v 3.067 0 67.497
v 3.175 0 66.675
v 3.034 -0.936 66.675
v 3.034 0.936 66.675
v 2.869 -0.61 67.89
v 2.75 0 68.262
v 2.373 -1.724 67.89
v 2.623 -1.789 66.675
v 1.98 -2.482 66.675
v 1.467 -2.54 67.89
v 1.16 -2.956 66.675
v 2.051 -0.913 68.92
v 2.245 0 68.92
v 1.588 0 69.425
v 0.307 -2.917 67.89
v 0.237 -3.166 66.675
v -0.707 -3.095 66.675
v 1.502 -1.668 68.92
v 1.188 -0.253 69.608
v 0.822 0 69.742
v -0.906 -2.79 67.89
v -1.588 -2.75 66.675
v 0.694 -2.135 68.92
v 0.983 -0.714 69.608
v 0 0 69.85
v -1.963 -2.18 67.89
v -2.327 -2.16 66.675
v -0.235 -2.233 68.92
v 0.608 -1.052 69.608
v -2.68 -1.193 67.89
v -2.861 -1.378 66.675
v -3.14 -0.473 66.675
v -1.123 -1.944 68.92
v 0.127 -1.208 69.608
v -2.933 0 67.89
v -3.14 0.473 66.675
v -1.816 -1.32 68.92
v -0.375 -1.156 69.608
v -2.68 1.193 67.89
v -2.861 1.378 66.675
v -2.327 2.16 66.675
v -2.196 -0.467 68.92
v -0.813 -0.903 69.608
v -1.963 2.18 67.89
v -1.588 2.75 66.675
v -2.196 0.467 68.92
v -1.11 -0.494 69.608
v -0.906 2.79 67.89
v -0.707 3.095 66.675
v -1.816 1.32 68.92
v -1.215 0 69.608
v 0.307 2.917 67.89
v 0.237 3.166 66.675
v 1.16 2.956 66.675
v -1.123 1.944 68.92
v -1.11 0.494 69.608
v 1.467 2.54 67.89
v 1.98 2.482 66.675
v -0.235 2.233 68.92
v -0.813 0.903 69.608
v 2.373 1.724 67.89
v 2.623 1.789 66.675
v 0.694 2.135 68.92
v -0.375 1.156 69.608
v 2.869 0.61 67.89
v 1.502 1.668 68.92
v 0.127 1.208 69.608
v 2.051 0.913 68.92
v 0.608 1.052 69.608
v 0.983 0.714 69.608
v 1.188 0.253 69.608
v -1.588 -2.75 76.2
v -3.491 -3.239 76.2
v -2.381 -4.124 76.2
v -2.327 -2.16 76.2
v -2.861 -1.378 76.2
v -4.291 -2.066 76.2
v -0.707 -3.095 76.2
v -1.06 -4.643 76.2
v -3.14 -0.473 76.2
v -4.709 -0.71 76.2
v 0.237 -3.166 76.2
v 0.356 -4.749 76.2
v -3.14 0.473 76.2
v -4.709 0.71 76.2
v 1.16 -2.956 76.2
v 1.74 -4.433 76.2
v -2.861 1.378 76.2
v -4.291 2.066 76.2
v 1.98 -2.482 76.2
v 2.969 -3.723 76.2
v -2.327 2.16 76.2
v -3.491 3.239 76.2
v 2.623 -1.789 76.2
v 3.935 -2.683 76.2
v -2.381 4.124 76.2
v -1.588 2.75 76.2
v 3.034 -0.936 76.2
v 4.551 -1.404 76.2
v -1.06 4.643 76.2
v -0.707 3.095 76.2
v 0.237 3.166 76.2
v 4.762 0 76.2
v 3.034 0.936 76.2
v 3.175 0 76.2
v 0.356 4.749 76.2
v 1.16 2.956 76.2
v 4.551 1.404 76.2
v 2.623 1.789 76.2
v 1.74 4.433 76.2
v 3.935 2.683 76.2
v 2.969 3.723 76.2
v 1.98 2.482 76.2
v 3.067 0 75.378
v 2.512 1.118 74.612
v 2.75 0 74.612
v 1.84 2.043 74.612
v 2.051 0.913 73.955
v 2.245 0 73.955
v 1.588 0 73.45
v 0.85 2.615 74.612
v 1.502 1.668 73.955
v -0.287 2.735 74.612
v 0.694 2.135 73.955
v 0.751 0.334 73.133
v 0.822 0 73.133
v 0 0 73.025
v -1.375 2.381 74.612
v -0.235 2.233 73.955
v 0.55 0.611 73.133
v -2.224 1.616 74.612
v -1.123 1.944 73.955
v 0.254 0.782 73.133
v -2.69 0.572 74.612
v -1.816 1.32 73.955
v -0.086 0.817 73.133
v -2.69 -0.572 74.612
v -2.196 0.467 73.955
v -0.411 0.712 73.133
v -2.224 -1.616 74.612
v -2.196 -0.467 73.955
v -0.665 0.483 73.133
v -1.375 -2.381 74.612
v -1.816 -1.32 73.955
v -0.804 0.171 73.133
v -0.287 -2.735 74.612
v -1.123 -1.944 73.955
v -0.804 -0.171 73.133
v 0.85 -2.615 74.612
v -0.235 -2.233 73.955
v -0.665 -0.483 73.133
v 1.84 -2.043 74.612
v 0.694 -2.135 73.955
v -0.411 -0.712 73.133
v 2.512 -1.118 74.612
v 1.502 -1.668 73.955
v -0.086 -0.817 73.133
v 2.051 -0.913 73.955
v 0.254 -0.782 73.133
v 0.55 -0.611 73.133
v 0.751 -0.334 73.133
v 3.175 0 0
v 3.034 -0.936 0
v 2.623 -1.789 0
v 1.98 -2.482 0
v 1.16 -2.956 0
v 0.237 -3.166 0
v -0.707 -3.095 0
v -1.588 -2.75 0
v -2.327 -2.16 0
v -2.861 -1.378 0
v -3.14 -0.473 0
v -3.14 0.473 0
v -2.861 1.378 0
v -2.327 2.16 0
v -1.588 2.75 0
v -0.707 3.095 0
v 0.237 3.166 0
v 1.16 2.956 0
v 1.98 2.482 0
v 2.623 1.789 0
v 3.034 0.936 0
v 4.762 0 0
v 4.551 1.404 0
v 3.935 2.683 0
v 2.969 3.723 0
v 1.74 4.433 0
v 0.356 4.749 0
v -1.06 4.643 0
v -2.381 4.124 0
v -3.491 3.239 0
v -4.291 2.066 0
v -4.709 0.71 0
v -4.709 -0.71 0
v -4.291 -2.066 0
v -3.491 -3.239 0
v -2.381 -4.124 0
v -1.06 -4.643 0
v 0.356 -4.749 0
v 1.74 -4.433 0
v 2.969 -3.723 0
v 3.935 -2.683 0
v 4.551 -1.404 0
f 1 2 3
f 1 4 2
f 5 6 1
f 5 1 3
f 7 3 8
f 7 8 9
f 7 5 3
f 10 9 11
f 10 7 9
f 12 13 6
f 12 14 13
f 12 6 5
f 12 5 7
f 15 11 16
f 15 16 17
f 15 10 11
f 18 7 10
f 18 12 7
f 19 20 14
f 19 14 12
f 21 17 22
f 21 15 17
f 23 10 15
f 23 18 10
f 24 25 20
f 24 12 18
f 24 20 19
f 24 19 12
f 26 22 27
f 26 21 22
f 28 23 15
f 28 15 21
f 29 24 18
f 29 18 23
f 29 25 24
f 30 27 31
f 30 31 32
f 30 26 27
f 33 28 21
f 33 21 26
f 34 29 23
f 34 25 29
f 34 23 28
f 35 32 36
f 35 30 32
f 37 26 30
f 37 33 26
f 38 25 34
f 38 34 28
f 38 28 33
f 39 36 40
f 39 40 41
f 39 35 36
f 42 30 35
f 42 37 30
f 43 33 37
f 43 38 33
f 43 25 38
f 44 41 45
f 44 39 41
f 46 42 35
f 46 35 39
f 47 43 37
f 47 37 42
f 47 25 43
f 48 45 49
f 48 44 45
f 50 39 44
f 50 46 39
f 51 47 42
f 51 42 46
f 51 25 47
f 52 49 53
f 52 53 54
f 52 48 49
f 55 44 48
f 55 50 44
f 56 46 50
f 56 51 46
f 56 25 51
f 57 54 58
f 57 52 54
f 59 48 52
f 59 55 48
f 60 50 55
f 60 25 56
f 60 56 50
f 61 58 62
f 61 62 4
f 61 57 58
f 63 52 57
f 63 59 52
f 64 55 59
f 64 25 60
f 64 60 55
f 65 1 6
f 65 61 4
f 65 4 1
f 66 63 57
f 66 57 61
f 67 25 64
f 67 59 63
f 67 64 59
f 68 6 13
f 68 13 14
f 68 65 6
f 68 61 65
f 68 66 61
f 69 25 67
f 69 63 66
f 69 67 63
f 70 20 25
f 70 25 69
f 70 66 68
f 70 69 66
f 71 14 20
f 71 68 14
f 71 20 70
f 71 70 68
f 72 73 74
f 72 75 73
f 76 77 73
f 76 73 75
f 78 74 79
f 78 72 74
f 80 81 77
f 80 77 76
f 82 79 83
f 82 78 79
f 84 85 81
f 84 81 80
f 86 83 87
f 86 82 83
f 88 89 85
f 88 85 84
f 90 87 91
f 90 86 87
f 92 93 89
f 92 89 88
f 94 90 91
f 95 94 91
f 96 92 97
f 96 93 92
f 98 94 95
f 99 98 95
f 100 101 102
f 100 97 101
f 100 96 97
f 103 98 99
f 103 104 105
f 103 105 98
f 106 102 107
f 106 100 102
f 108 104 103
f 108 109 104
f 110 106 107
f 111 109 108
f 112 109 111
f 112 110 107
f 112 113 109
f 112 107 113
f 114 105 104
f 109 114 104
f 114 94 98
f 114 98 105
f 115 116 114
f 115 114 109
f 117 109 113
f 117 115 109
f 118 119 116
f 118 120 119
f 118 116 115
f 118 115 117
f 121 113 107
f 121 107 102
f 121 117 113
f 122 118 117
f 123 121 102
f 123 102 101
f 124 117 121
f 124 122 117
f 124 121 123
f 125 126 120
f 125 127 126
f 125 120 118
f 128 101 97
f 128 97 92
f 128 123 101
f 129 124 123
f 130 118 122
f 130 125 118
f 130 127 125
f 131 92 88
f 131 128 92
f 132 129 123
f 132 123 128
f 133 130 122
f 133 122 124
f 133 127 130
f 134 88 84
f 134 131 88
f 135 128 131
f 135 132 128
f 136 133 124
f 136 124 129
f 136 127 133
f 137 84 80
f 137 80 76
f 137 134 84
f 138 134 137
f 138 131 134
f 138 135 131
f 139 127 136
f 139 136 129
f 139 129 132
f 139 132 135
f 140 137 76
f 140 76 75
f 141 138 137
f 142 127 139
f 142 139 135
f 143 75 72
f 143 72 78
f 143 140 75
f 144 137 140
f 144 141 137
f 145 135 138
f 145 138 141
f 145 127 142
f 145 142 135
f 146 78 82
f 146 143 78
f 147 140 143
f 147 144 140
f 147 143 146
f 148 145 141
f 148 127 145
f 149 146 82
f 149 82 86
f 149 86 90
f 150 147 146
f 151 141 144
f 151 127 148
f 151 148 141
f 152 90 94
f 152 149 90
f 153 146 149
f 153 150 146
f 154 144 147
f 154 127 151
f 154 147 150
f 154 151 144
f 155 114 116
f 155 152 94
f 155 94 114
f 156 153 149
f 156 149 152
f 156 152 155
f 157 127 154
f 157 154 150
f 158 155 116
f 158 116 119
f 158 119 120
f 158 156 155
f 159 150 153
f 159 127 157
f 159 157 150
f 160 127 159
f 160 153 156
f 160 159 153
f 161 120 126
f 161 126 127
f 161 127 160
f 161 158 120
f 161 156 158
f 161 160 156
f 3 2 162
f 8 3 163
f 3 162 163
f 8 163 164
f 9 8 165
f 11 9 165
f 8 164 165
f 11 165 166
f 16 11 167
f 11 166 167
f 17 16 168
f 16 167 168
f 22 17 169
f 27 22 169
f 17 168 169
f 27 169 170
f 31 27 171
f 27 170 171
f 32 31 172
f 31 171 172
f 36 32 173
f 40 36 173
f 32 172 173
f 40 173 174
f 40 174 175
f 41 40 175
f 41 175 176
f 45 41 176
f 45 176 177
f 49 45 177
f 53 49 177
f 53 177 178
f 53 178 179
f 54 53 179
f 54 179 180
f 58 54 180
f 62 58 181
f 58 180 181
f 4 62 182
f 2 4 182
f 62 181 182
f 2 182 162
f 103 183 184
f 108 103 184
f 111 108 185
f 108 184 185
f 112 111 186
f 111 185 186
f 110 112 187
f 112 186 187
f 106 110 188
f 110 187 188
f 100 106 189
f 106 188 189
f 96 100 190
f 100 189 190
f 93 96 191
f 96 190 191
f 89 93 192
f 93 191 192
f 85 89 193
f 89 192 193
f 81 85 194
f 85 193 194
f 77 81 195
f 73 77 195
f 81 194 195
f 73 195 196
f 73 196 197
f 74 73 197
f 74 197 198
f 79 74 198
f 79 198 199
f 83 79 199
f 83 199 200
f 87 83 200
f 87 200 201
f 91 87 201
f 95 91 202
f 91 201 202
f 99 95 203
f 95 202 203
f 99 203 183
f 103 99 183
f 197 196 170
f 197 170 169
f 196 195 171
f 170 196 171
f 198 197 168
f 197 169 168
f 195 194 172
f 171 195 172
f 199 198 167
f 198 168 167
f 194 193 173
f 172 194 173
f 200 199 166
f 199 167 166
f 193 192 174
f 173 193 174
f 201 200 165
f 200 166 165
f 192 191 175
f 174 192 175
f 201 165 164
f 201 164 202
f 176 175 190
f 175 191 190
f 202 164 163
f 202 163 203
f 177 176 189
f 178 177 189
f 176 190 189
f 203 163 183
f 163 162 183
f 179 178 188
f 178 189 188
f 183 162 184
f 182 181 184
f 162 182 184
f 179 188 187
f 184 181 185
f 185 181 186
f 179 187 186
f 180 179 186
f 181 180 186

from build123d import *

# Parameters (mm, degrees)
F0_R     = 4.7625
F1_DEPTH = 76.2
F2_R     = 3.175
F3_DEPTH = 3.175
F4_R     = 3.17499
F5_R     = 3.175
F6_DEPTH = 69.85
F7_R     = 3.175


# Not quite as in the source:
# - a fillet or chamfer is up to 0.001 mm smaller than in the source, because OpenCascade refuses the exact size


with BuildPart() as f1:
    # F0 (on Top) → F1 (new body)
    with BuildSketch(Plane.XY):
        Circle(F0_R)
    extrude(amount=F1_DEPTH)

    # F2 (on face) → F3 (cut)
    with BuildSketch(Plane.XY.offset(76.2)):
        Circle(F2_R)
    extrude(amount=-F3_DEPTH, mode=Mode.SUBTRACT)

    # F4 (radius 3.175 in the source; OpenCascade refuses exactly that, so slightly less here)
    f4_edges = [f1.edges().sort_by_distance(p)[0] for p in [
        (-3.175, 0, 73.025),
    ]]
    fillet(f4_edges, radius=F4_R)

    # F5 (on face) → F6 (cut)
    with BuildSketch(Plane(origin=(0, 0, 0), x_dir=(1, 0, 0), z_dir=(0, 0, -1))):
        Circle(F5_R)
    extrude(amount=-F6_DEPTH, mode=Mode.SUBTRACT)

    # F7
    f7_edges = [f1.edges().sort_by_distance(p)[0] for p in [
        (-3.175, 0, 69.85),
    ]]
    fillet(f7_edges, radius=F7_R)


solid = f1.part
